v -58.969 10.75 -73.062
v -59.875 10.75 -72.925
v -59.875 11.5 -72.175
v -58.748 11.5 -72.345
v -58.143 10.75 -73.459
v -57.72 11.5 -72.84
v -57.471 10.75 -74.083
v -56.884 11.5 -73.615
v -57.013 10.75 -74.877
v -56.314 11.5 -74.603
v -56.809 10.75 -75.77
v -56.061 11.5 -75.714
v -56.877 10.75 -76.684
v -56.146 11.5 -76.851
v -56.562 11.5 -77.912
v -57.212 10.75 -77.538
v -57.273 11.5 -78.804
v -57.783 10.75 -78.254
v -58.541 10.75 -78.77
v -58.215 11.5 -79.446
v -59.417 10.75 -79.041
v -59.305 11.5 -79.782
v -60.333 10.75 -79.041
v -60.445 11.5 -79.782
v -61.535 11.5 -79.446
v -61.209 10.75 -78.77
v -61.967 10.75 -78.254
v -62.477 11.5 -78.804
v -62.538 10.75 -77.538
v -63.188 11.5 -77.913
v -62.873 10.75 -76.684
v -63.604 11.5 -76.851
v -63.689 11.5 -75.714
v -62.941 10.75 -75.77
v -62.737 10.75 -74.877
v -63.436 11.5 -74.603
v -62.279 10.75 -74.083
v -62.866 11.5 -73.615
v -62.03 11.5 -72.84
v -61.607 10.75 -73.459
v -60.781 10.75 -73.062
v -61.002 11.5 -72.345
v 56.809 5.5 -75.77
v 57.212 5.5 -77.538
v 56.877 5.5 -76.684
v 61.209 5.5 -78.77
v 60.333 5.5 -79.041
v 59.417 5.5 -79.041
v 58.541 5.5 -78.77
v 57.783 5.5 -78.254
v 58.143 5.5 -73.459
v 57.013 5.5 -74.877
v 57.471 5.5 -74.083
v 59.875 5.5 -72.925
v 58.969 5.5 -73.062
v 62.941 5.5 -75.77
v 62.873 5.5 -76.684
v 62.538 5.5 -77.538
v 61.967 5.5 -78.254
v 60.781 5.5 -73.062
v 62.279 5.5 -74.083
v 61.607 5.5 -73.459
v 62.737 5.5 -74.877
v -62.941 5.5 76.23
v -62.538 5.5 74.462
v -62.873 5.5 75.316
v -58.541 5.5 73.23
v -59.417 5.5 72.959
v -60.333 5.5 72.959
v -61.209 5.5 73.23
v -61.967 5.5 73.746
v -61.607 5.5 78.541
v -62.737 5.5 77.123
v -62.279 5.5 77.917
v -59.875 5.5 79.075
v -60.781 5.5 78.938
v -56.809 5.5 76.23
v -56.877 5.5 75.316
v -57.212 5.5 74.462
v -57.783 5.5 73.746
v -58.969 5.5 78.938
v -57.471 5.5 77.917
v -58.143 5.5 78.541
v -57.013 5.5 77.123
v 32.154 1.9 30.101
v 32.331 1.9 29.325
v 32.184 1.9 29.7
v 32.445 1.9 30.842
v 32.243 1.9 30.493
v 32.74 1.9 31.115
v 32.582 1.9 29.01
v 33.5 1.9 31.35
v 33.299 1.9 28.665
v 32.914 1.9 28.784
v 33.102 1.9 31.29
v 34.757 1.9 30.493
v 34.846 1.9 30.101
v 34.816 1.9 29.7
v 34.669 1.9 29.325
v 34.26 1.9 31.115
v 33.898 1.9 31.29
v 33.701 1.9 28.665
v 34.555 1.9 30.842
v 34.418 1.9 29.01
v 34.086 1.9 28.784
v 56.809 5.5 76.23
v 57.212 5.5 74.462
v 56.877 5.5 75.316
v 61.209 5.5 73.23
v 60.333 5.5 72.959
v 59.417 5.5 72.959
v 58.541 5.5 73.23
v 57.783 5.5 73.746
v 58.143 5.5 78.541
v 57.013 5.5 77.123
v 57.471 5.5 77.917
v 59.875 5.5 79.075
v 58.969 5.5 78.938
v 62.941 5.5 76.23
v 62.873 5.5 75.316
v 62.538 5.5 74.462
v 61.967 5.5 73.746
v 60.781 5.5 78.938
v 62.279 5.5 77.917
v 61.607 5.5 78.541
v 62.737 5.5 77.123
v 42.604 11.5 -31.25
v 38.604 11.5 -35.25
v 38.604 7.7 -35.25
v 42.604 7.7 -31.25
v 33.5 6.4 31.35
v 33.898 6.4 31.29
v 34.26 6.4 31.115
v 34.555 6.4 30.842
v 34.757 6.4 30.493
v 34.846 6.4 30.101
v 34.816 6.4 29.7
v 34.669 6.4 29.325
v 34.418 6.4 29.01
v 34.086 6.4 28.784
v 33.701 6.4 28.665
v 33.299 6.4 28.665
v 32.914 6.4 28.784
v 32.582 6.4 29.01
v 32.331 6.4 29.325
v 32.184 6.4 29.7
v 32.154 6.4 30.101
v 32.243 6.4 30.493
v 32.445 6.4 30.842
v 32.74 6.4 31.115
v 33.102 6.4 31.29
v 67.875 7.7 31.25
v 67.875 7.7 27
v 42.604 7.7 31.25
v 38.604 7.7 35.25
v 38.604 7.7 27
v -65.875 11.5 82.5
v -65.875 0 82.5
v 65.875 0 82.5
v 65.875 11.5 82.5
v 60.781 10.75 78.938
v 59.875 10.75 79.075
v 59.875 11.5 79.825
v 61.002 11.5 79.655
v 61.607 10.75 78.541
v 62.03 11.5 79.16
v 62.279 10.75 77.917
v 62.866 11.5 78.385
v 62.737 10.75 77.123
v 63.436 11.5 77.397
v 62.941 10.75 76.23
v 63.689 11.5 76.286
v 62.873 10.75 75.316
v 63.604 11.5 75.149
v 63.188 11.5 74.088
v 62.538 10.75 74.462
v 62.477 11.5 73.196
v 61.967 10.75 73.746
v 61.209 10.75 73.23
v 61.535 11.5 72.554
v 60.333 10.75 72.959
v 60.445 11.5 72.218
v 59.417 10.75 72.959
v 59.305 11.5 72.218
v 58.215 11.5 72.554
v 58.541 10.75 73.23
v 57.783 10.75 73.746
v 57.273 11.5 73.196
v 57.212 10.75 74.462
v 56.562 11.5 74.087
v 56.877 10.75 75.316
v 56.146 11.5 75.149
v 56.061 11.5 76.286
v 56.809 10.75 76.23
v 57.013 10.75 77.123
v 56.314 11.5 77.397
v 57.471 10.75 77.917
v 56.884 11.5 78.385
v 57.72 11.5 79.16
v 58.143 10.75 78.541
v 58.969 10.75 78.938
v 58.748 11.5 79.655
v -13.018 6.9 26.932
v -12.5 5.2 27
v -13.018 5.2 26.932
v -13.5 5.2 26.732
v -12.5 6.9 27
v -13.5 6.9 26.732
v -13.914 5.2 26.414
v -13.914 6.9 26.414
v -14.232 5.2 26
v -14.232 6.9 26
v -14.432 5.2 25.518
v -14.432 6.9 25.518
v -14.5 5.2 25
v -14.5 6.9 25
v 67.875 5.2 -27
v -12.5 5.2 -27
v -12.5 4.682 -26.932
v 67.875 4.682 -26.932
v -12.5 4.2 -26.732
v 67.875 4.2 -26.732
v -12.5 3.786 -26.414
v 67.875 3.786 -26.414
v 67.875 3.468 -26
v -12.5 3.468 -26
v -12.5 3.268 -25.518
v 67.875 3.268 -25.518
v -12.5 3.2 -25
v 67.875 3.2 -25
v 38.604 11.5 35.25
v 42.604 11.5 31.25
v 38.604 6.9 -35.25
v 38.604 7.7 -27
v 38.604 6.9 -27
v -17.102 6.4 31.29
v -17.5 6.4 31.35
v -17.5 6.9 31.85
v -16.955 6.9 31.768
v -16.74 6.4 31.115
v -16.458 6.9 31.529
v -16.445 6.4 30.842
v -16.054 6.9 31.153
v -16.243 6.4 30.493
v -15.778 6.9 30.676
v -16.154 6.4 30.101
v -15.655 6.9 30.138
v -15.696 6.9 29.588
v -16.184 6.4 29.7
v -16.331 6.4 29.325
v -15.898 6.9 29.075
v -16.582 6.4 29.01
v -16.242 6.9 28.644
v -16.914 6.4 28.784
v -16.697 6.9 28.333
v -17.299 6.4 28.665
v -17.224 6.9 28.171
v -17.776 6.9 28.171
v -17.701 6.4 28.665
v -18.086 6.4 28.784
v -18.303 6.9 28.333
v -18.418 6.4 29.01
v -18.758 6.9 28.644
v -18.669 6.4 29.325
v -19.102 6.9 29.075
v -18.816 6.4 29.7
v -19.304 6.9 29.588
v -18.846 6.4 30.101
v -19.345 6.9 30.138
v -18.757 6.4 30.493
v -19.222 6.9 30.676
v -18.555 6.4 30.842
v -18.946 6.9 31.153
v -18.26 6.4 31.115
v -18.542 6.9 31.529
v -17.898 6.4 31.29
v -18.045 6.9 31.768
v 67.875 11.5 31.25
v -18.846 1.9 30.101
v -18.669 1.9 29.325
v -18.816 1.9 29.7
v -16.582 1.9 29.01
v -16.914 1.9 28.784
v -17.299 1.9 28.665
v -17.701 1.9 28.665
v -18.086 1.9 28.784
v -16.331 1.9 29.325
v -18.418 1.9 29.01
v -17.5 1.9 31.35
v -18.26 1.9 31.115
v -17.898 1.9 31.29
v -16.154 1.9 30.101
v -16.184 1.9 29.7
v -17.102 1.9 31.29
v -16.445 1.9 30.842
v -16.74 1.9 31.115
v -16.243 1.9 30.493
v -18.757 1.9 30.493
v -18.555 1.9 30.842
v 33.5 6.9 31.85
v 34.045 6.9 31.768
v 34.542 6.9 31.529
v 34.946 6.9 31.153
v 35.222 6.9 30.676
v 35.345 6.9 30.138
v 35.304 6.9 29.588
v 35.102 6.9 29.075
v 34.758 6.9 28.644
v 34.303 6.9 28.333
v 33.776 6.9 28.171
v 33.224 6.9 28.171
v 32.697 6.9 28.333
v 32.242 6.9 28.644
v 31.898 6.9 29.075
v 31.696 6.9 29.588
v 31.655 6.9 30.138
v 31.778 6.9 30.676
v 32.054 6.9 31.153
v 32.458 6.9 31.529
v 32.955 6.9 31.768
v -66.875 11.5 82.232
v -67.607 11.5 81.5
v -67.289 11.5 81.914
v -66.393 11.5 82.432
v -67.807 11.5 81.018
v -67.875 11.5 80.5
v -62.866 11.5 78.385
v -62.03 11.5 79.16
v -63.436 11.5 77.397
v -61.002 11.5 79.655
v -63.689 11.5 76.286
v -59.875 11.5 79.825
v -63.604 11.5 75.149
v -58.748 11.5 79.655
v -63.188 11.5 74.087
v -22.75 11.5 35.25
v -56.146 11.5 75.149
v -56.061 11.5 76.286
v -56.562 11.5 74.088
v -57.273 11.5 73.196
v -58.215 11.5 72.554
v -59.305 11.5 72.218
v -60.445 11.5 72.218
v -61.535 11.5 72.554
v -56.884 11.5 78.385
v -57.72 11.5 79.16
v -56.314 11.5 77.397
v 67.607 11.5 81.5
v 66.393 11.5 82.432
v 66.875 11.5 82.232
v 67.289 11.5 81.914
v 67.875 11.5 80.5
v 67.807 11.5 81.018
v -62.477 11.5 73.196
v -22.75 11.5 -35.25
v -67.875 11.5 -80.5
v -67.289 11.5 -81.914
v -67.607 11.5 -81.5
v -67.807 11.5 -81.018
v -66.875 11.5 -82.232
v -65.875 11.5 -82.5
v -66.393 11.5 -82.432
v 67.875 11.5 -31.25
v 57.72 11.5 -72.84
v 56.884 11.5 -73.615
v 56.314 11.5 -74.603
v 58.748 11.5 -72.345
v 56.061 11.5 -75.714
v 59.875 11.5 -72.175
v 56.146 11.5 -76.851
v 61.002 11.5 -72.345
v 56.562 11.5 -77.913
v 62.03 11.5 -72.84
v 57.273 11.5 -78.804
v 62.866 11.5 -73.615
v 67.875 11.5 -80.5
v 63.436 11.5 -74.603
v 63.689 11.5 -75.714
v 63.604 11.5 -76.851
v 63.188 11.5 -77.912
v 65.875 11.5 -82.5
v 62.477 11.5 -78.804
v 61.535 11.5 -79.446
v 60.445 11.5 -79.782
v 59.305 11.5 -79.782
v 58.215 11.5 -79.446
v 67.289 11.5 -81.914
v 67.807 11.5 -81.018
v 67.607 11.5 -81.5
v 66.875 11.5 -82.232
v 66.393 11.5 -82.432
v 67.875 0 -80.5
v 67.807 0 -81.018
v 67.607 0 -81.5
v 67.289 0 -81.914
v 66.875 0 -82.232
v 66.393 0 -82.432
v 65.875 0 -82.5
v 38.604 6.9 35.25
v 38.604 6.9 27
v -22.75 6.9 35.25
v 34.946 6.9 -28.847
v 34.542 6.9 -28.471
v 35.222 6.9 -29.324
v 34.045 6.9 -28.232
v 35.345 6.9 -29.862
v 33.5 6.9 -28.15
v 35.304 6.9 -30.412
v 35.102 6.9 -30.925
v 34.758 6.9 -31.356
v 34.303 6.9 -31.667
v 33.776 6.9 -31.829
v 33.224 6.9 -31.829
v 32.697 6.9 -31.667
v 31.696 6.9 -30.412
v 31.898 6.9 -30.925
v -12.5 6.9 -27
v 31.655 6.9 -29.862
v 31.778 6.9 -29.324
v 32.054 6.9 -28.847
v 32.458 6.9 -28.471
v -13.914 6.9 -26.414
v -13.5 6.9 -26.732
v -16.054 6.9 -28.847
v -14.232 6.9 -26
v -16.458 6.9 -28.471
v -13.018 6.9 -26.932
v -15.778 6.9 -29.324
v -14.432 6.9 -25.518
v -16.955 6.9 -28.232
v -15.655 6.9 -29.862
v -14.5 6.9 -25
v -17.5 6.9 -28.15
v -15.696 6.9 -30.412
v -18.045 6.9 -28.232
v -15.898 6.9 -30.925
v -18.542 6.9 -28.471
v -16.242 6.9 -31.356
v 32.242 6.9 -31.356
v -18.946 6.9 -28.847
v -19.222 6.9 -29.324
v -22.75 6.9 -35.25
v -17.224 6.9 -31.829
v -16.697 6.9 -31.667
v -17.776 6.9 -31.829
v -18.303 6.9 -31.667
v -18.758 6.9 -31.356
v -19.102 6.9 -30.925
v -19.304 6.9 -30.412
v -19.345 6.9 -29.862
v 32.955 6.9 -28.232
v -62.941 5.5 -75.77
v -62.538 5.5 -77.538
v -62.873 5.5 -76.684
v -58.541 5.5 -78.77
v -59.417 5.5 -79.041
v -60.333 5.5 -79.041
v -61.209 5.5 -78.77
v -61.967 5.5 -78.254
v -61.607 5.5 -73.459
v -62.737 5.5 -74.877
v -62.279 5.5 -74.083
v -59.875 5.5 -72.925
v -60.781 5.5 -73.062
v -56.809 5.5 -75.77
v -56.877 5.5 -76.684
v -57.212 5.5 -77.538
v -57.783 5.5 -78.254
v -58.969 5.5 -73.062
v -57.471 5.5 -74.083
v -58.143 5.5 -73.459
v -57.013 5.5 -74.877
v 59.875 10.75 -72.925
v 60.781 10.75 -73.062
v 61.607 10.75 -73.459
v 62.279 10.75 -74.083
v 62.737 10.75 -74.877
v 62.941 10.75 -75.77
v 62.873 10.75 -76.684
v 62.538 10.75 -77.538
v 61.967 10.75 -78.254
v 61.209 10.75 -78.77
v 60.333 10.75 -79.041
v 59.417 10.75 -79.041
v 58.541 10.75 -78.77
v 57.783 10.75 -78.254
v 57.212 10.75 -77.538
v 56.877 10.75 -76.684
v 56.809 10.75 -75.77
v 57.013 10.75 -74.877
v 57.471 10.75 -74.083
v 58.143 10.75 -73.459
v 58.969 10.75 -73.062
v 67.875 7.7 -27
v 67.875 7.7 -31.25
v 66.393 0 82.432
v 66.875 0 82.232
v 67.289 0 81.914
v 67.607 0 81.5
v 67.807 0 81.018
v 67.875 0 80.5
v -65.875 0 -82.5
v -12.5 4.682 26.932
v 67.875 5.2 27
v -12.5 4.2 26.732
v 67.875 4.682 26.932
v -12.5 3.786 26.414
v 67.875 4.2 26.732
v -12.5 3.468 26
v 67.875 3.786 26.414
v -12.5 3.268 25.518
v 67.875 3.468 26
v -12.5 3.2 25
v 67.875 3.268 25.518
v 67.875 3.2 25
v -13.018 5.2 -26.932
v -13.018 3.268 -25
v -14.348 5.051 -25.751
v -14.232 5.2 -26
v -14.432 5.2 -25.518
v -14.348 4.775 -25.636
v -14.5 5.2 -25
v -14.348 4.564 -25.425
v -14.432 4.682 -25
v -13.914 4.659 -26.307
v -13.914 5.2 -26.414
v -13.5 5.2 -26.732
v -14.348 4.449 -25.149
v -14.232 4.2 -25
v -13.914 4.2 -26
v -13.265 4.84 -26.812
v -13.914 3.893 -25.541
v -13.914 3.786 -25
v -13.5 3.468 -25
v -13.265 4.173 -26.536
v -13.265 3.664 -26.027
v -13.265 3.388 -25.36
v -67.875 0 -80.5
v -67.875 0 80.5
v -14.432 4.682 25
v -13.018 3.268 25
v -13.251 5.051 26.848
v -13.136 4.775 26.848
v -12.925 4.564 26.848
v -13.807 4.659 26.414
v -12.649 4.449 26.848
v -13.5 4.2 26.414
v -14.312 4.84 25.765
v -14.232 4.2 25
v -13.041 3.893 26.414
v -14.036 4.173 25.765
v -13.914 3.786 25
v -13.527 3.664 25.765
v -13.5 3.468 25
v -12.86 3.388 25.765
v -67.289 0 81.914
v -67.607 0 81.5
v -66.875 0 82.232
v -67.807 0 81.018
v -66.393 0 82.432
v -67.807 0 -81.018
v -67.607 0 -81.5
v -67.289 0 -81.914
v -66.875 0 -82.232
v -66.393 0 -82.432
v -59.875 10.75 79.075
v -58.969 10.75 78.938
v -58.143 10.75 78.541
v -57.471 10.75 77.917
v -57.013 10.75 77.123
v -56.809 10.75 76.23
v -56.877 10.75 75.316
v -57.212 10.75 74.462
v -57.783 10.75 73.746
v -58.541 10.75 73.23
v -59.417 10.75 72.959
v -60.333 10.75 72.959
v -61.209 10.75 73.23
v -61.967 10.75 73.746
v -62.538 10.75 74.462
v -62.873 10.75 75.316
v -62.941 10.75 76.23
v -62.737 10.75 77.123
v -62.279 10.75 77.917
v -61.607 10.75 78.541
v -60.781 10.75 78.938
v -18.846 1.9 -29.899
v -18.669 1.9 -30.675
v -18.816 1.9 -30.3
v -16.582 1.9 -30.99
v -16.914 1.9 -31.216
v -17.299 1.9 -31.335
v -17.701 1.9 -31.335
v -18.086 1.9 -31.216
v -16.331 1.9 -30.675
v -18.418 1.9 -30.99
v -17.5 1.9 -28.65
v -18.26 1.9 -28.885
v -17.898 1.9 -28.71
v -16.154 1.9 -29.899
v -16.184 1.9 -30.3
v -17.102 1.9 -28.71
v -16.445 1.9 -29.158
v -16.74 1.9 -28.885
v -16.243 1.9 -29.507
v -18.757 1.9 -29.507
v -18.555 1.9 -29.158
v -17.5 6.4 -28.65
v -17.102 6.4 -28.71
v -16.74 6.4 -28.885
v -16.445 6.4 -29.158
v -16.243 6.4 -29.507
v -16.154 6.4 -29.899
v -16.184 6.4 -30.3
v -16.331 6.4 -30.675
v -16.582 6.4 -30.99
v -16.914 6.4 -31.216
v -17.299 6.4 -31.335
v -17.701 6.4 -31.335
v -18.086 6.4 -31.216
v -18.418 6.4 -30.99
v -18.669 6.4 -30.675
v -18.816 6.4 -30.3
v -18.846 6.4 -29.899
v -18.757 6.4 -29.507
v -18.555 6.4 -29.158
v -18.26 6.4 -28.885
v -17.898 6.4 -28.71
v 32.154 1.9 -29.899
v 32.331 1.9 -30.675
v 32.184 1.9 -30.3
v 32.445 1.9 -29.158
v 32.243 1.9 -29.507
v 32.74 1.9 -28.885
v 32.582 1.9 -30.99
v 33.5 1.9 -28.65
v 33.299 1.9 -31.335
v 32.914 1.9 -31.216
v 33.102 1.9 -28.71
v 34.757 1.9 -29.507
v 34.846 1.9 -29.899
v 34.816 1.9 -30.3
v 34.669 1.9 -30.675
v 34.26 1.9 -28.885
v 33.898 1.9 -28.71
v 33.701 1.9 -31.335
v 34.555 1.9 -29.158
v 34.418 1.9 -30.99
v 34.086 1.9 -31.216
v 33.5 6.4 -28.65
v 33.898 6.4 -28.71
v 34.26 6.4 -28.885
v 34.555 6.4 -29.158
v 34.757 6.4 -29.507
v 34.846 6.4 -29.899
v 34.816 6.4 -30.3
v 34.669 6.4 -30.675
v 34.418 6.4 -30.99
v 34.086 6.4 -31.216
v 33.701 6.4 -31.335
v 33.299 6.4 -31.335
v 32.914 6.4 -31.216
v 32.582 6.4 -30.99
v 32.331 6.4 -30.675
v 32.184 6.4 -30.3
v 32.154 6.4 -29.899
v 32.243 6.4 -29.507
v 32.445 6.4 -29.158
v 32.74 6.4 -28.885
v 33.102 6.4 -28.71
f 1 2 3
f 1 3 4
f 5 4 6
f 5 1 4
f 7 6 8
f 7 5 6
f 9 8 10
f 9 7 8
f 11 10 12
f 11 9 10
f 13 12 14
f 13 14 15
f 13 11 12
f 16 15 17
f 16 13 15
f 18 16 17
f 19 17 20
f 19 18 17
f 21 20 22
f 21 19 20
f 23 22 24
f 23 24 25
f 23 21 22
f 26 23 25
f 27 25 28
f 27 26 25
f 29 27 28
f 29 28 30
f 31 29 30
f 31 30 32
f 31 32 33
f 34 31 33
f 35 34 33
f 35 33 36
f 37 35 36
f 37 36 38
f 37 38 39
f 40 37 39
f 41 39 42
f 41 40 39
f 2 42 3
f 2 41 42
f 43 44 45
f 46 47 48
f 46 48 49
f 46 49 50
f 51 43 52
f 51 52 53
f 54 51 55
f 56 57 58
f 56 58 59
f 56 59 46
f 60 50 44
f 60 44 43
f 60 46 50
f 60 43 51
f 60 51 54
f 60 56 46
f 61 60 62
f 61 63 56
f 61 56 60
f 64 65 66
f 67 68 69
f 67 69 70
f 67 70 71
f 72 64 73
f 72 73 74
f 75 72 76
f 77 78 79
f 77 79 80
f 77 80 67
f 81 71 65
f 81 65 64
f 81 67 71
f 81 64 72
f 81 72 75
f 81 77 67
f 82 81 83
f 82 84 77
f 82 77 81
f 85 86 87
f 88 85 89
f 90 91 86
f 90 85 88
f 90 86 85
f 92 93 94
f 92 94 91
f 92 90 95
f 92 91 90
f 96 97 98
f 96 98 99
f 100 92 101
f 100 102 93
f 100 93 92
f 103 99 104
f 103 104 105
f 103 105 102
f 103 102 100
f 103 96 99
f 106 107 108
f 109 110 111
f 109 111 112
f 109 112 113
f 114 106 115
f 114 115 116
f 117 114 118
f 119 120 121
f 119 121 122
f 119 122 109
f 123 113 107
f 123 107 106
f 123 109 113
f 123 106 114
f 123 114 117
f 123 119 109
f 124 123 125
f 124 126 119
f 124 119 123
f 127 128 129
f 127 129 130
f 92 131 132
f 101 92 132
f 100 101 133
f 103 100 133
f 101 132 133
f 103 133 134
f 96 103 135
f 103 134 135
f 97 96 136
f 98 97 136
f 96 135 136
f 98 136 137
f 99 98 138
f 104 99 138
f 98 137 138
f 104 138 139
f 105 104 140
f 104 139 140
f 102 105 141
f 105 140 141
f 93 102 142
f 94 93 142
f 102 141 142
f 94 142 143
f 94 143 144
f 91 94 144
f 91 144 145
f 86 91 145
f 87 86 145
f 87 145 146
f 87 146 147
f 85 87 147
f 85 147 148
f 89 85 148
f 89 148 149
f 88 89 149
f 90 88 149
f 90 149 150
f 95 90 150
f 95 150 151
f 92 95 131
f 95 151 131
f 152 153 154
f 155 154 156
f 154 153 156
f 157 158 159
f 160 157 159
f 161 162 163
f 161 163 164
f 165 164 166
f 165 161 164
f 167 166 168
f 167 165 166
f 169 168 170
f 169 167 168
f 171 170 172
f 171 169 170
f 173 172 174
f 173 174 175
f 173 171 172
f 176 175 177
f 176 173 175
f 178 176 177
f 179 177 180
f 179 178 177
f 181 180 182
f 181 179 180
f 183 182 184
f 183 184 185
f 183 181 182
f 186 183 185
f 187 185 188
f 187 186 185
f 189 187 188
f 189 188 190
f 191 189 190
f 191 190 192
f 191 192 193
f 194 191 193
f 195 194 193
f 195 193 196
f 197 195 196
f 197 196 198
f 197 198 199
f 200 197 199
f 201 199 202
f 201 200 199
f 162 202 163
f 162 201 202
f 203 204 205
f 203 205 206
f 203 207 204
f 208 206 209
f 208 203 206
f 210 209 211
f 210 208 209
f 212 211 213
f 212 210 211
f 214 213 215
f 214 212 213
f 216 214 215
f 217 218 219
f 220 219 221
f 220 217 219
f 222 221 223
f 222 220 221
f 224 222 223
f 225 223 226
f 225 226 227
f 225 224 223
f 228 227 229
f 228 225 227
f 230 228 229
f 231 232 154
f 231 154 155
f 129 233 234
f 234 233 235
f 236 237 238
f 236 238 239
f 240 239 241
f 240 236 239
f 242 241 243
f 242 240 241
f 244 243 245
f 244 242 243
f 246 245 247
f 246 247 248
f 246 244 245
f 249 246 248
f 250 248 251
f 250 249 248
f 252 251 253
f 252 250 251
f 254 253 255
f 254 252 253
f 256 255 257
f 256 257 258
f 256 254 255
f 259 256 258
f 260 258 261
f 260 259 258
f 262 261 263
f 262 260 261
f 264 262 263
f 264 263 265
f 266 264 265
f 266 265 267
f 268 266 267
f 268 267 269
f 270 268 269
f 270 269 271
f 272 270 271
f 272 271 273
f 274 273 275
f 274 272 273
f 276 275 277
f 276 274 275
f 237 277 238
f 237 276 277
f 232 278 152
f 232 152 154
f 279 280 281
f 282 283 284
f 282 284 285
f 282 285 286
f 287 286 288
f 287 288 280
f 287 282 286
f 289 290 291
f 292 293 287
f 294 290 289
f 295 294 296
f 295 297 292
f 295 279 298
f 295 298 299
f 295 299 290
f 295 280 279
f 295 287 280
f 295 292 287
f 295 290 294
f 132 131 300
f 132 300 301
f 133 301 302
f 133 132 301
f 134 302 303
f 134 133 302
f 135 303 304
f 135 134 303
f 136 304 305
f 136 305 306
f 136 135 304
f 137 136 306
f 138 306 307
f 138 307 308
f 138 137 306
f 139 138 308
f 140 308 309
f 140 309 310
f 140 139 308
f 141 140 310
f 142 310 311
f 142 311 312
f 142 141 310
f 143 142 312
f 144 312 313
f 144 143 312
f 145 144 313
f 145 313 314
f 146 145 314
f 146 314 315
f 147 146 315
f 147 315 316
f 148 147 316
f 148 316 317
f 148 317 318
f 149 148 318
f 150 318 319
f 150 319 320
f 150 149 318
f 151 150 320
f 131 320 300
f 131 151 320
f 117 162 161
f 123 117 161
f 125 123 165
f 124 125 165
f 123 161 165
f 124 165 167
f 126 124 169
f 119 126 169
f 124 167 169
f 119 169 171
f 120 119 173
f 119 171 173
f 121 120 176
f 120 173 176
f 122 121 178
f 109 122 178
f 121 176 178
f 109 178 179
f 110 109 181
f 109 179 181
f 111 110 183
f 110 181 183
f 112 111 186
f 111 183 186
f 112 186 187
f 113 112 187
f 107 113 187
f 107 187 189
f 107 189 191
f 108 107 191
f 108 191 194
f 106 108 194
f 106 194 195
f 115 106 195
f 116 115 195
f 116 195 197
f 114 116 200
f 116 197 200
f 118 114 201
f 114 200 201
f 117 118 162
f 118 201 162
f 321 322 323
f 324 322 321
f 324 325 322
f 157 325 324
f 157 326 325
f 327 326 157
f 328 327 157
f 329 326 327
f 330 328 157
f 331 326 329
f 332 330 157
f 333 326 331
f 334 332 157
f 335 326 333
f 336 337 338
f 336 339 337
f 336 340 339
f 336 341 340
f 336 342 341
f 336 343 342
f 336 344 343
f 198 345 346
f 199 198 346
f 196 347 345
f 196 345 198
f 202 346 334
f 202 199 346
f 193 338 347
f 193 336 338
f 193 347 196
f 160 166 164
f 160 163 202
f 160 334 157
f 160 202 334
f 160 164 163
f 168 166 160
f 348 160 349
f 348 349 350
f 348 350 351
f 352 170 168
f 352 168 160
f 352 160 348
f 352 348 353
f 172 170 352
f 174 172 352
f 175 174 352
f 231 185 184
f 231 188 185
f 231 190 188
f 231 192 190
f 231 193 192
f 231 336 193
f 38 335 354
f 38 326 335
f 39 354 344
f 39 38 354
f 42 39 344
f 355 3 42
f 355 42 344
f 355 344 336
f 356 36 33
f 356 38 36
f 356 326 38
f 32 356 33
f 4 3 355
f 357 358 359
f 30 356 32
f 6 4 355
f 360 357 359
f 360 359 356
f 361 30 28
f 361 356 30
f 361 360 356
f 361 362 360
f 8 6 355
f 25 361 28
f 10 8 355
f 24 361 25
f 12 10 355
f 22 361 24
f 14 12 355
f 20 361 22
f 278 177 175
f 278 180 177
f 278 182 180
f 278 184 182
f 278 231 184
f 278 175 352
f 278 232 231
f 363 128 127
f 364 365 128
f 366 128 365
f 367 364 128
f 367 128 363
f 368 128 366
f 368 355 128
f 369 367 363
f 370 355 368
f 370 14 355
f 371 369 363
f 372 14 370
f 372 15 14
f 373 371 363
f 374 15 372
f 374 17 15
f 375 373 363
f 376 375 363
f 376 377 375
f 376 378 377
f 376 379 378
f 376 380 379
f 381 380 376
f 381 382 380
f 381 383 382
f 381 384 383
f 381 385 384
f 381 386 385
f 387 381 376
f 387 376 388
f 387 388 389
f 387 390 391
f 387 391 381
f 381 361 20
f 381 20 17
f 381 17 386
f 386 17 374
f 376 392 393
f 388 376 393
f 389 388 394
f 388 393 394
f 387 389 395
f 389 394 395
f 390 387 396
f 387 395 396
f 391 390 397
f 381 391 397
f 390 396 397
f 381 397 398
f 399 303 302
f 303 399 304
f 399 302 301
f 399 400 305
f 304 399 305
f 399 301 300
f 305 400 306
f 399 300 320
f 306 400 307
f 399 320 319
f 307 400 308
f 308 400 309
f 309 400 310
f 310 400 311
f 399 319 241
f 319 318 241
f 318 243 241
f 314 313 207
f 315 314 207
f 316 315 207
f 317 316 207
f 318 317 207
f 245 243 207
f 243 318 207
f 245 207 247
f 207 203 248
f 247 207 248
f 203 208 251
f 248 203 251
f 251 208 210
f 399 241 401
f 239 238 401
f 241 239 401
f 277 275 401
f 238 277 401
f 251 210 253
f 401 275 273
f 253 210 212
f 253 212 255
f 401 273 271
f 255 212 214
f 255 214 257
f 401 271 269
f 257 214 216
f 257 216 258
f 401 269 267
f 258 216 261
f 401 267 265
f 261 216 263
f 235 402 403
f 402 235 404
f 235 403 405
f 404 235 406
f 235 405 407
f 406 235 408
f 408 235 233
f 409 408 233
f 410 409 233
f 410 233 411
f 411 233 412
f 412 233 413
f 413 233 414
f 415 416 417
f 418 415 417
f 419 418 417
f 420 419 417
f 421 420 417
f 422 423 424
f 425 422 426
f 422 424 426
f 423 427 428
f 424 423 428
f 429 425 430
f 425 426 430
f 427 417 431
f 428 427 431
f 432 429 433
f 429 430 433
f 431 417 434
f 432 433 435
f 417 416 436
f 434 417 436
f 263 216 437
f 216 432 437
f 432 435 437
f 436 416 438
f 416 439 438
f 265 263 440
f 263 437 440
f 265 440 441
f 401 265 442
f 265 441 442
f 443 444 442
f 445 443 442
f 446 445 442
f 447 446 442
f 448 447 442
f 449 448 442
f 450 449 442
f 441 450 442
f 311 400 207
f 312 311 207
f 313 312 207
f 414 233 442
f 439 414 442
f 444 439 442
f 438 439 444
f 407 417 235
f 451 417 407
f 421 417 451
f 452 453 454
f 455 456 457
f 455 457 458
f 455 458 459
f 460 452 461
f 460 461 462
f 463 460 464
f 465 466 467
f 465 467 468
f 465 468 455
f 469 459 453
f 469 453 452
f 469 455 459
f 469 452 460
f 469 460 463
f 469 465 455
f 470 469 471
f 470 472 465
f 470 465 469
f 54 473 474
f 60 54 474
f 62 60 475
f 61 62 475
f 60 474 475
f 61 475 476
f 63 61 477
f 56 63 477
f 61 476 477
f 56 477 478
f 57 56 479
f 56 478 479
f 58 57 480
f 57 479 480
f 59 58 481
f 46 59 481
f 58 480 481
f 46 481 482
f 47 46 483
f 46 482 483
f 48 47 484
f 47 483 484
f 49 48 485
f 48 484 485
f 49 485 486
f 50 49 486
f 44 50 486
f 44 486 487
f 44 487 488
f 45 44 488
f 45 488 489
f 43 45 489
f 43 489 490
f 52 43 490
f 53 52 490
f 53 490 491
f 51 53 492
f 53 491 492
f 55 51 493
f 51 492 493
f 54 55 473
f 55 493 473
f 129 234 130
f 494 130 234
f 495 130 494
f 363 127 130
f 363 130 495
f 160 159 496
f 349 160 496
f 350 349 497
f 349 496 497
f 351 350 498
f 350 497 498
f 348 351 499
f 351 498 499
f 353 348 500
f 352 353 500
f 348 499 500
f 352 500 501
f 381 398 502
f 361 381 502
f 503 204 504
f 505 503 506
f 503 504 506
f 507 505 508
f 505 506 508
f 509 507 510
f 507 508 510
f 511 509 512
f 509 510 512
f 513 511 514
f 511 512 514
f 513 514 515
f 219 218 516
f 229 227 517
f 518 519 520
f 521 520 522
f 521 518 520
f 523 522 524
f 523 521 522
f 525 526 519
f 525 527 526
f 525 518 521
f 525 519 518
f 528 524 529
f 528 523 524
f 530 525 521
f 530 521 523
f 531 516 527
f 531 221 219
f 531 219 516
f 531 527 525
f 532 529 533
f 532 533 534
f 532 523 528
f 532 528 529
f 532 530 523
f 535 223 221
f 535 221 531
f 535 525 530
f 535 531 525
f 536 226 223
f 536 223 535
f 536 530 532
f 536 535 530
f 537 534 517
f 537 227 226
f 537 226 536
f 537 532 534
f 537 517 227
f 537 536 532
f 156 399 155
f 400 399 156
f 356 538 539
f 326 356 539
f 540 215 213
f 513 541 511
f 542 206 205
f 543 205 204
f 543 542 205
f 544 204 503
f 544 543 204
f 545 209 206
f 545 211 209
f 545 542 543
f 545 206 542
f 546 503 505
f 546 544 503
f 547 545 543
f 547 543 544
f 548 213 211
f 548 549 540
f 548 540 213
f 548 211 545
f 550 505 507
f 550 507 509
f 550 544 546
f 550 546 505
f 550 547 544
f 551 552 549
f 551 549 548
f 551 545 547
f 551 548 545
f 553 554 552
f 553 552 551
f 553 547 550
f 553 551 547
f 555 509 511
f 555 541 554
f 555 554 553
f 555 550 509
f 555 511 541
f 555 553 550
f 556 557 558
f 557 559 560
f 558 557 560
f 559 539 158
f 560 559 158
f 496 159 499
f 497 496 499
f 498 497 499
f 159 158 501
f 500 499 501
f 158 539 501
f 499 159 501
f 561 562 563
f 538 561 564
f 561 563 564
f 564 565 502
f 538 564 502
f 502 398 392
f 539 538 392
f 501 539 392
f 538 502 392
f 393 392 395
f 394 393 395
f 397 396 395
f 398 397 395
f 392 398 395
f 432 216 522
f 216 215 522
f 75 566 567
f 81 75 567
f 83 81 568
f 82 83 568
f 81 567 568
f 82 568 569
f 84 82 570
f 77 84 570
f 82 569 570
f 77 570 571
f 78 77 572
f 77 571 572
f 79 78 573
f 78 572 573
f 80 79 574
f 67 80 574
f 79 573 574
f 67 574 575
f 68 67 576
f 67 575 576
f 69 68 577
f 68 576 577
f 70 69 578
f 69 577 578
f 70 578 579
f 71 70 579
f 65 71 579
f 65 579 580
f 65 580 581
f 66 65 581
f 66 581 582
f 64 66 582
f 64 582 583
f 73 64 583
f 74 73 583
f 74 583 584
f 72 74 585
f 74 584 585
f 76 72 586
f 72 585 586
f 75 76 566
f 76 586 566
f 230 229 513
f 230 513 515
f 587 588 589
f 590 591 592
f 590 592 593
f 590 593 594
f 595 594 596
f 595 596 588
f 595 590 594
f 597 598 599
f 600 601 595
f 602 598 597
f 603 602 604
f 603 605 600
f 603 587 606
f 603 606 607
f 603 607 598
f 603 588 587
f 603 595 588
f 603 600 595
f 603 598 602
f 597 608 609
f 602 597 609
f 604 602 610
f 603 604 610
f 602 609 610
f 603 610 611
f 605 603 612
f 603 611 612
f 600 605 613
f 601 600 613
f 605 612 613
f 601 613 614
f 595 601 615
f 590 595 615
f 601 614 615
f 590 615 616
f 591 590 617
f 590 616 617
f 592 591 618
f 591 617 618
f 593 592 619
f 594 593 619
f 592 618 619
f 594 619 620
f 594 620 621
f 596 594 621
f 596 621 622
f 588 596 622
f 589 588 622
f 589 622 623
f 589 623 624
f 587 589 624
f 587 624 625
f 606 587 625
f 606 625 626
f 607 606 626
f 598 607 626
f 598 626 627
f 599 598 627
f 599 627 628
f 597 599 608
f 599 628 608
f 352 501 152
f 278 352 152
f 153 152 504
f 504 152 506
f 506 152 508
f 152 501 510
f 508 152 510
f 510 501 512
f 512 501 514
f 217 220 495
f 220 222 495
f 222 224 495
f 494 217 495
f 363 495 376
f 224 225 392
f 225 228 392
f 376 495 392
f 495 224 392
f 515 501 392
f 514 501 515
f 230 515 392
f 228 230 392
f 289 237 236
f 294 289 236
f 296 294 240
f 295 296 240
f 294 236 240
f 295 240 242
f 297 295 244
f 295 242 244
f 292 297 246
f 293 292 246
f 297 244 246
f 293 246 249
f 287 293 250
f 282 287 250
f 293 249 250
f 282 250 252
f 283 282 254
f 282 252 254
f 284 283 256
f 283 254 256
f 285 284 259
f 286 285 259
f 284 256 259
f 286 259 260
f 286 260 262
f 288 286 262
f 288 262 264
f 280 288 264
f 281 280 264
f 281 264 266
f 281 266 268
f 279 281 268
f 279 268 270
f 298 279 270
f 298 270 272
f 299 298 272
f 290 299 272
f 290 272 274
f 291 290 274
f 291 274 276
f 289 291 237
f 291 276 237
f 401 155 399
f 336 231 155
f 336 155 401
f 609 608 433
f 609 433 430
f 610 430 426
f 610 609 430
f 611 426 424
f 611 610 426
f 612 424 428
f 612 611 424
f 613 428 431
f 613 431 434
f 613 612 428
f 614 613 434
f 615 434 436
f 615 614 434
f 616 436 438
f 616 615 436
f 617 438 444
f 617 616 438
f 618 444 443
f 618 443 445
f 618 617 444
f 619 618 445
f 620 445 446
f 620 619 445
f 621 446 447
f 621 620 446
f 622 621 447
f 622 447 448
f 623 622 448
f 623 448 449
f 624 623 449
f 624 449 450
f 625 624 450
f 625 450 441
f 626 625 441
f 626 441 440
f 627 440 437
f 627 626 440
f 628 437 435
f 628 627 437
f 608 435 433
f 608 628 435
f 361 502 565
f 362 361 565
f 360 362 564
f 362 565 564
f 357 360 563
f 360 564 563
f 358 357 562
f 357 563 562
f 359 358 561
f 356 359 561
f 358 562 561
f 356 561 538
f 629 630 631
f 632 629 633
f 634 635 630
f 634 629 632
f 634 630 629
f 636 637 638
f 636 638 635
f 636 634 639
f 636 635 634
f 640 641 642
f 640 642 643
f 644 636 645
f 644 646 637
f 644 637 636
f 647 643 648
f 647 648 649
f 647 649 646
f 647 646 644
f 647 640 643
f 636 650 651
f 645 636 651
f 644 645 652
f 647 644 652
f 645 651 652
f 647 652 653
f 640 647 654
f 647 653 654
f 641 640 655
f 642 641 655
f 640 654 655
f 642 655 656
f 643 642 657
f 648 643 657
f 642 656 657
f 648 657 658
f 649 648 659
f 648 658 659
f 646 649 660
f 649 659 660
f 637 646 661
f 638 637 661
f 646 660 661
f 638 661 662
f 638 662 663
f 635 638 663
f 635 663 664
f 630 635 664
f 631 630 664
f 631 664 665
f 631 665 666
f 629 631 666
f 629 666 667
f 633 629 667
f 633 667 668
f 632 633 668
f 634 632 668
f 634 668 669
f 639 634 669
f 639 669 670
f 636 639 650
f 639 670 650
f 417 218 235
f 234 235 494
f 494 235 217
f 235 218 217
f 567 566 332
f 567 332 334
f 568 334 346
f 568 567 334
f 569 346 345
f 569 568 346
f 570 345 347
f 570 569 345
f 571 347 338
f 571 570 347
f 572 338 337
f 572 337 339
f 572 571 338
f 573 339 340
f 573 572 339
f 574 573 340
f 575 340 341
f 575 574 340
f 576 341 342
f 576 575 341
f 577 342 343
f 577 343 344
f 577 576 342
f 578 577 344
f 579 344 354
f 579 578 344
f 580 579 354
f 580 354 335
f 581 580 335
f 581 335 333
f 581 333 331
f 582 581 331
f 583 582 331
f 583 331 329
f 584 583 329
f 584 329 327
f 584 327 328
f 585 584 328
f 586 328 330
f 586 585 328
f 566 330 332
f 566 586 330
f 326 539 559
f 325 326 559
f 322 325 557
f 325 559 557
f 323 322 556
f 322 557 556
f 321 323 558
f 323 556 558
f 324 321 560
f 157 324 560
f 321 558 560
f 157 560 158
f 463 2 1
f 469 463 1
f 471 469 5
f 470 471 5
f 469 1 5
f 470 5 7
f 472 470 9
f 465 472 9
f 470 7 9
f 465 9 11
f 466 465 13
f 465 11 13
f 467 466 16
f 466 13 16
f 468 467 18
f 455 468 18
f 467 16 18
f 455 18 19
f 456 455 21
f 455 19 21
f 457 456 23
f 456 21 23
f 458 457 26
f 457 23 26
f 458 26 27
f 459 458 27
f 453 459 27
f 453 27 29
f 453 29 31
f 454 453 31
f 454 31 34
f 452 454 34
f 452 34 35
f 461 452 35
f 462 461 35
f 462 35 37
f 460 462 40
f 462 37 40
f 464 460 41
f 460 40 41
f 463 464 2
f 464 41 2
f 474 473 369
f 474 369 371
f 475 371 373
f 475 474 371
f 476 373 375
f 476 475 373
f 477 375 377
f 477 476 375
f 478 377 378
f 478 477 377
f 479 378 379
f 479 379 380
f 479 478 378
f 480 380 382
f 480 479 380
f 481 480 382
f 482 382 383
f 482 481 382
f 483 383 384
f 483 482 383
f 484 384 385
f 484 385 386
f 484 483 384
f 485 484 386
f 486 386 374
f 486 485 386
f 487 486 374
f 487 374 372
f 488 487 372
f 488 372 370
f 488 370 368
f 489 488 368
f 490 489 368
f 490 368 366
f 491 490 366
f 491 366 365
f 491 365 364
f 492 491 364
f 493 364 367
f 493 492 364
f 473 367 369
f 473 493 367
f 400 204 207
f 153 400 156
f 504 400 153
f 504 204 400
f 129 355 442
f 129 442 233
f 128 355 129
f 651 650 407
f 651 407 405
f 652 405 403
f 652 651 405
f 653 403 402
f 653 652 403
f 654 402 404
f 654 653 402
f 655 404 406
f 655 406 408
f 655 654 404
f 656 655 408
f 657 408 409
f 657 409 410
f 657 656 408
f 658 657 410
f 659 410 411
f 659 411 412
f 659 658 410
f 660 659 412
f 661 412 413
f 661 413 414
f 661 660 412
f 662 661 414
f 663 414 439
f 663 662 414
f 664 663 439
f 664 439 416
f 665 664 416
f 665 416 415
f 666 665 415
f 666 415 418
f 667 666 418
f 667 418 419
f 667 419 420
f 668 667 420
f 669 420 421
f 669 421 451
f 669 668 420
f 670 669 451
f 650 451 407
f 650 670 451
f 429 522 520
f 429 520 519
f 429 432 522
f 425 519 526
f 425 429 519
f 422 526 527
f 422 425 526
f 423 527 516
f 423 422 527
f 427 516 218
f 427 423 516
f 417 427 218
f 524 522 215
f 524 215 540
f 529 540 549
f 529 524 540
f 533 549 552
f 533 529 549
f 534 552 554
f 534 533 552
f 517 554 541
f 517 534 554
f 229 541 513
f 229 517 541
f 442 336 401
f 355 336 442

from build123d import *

# Parameters (mm, degrees)
BOSS_EXTRUDE1_DEPTH     = 11.5
SKETCH4_R               = 3.075
CUT_EXTRUDE1_DEPTH      = 6
CUT_EXTRUDE6_DEPTH      = 4.6
CUT_EXTRUDE3_DEPTH      = 108.055479192
CUT_EXTRUDE3_DEPTH_BACK = 3.7
SKETCH24_W              = 82.375
SKETCH24_H              = 54
SKETCH25_R              = 1.35
CUT_EXTRUDE4_DEPTH      = 5
CHAMFER4_SIZE           = 0.5
FILLET1_R               = 2
BOSS_EXTRUDE2_DEPTH     = 0.8
CHAMFER5_SIZE           = 0.75


with BuildPart() as part:
    # Sketch1 → Boss-Extrude1 (new body)
    with BuildSketch(Plane(origin=(0, 0, 0), x_dir=(1, 0, 0), z_dir=(0, 1, 0))):
        with BuildLine():
            Line((-67.875, 67.5), (-67.875, -67.5))
            Line((-67.875, -67.5), (-67.875, -80.5))
            ThreePointArc((-67.875, -80.5), (-67.289213562, -81.914213562), (-65.875, -82.5))
            Line((-65.875, -82.5), (65.875, -82.5))
            ThreePointArc((65.875, -82.5), (67.289213562, -81.914213562), (67.875, -80.5))
            Line((67.875, -80.5), (67.875, -67.5))
            Line((67.875, -67.5), (67.875, 67.5))
            Line((67.875, 67.5), (67.875, 80.5))
            ThreePointArc((67.875, 80.5), (67.289213562, 81.914213562), (65.875, 82.5))
            Line((65.875, 82.5), (-65.875, 82.5))
            ThreePointArc((-65.875, 82.5), (-67.289213562, 81.914213562), (-67.875, 80.5))
            Line((-67.875, 80.5), (-67.875, 67.5))
        make_face()
    extrude(amount=BOSS_EXTRUDE1_DEPTH)

    # Sketch4 → Cut-Extrude1 (cut)
    with BuildSketch(Plane(origin=(0, 11.5, 0), x_dir=(1, 0, 0), z_dir=(0, 1, 0))):
        with Locations(Location((-59.875, -76, 0), (0, 0, 270))):
            Circle(SKETCH4_R)
        with Locations(Location((59.875, -76, 0), (0, 0, 270))):
            Circle(SKETCH4_R)
        with Locations(Location((59.875, 76, 0), (0, 0, 270))):
            Circle(SKETCH4_R)
        with Locations(Location((-59.875, 76, 0), (0, 0, 270))):
            Circle(SKETCH4_R)
    extrude(amount=-CUT_EXTRUDE1_DEPTH, mode=Mode.SUBTRACT)

    # Sketch21 → Cut-Extrude6 (cut)
    with BuildSketch(Plane(origin=(0, 11.5, 0), x_dir=(1, 0, 0), z_dir=(0, 1, 0))):
        Polygon((67.875, 31), (67.875, -31), (67.875, -31.25), (42.603553391, -31.25), (38.603553391, -35.25), (-22.75, -35.25), (-22.75, 35.25), (38.603553391, 35.25), (42.603553391, 31.25), (67.875, 31.25), align=None)
    extrude(amount=-CUT_EXTRUDE6_DEPTH, mode=Mode.SUBTRACT)

    # Sketch24 → Cut-Extrude3 (cut, two sides: drawn at the far end of the back side and taken through both)
    with BuildSketch(Plane(origin=(0, 6.9, 0), x_dir=(1, 0, 0), z_dir=(0, 1, 0)).offset(-CUT_EXTRUDE3_DEPTH_BACK)):
        with Locations((26.6875, 0)):
            Rectangle(SKETCH24_W, SKETCH24_H)
    extrude(amount=CUT_EXTRUDE3_DEPTH + CUT_EXTRUDE3_DEPTH_BACK, mode=Mode.SUBTRACT)

    # Sketch25 → Cut-Extrude4 (cut)
    with BuildSketch(Plane(origin=(0, 6.9, 0), x_dir=(1, 0, 0), z_dir=(0, 1, 0))):
        with Locations(Location((33.5, 30, 0), (0, 0, 270))):
            Circle(SKETCH25_R)
        with Locations(Location((-17.5, 30, 0), (0, 0, 270))):
            Circle(SKETCH25_R)
        with Locations(Location((33.5, -30, 0), (0, 0, 270))):
            Circle(SKETCH25_R)
        with Locations(Location((-17.5, -30, 0), (0, 0, 270))):
            Circle(SKETCH25_R)
    extrude(amount=-CUT_EXTRUDE4_DEPTH, mode=Mode.SUBTRACT)

    # Chamfer4
    chamfer4_edges = [part.edges().sort_by_distance(p)[0] for p in [
        (-17.5, 6.9, -31.35),
        (33.5, 6.9, 28.65),
        (-17.5, 6.9, 28.65),
        (33.5, 6.9, -31.35),
    ]]
    chamfer(chamfer4_edges, length=CHAMFER4_SIZE)

    # Fillet1
    fillet1_edges = [part.edges().sort_by_distance(p)[0] for p in [
        (26.6875, 3.2, -27),
        (-14.5, 5.05, -27),
        (-14.5, 3.2, 0),
        (-14.5, 5.05, 27),
        (26.6875, 3.2, 27),
    ]]
    fillet(fillet1_edges, radius=FILLET1_R)

    # Sketch26 → Boss-Extrude2 (add)
    with BuildSketch(Plane(origin=(0, 6.9, 0), x_dir=(1, 0, 0), z_dir=(0, 1, 0))):
        Polygon((38.603553391, 35.25), (38.603553391, 27), (67.875, 27), (67.875, 31.25), (42.603553391, 31.25), align=None)
        Polygon((42.603553391, -31.25), (38.603553391, -35.25), (38.603553391, -27), (67.875, -27), (67.875, -31.25), align=None)
    extrude(amount=BOSS_EXTRUDE2_DEPTH)

    # Chamfer5
    chamfer5_edges = [part.edges().sort_by_distance(p)[0] for p in [
        (-59.875, 11.5, -79.075),
        (59.875, 11.5, -79.075),
        (59.875, 11.5, 72.925),
        (-59.875, 11.5, 72.925),
    ]]
    chamfer(chamfer5_edges, length=CHAMFER5_SIZE)


solid = part.part
